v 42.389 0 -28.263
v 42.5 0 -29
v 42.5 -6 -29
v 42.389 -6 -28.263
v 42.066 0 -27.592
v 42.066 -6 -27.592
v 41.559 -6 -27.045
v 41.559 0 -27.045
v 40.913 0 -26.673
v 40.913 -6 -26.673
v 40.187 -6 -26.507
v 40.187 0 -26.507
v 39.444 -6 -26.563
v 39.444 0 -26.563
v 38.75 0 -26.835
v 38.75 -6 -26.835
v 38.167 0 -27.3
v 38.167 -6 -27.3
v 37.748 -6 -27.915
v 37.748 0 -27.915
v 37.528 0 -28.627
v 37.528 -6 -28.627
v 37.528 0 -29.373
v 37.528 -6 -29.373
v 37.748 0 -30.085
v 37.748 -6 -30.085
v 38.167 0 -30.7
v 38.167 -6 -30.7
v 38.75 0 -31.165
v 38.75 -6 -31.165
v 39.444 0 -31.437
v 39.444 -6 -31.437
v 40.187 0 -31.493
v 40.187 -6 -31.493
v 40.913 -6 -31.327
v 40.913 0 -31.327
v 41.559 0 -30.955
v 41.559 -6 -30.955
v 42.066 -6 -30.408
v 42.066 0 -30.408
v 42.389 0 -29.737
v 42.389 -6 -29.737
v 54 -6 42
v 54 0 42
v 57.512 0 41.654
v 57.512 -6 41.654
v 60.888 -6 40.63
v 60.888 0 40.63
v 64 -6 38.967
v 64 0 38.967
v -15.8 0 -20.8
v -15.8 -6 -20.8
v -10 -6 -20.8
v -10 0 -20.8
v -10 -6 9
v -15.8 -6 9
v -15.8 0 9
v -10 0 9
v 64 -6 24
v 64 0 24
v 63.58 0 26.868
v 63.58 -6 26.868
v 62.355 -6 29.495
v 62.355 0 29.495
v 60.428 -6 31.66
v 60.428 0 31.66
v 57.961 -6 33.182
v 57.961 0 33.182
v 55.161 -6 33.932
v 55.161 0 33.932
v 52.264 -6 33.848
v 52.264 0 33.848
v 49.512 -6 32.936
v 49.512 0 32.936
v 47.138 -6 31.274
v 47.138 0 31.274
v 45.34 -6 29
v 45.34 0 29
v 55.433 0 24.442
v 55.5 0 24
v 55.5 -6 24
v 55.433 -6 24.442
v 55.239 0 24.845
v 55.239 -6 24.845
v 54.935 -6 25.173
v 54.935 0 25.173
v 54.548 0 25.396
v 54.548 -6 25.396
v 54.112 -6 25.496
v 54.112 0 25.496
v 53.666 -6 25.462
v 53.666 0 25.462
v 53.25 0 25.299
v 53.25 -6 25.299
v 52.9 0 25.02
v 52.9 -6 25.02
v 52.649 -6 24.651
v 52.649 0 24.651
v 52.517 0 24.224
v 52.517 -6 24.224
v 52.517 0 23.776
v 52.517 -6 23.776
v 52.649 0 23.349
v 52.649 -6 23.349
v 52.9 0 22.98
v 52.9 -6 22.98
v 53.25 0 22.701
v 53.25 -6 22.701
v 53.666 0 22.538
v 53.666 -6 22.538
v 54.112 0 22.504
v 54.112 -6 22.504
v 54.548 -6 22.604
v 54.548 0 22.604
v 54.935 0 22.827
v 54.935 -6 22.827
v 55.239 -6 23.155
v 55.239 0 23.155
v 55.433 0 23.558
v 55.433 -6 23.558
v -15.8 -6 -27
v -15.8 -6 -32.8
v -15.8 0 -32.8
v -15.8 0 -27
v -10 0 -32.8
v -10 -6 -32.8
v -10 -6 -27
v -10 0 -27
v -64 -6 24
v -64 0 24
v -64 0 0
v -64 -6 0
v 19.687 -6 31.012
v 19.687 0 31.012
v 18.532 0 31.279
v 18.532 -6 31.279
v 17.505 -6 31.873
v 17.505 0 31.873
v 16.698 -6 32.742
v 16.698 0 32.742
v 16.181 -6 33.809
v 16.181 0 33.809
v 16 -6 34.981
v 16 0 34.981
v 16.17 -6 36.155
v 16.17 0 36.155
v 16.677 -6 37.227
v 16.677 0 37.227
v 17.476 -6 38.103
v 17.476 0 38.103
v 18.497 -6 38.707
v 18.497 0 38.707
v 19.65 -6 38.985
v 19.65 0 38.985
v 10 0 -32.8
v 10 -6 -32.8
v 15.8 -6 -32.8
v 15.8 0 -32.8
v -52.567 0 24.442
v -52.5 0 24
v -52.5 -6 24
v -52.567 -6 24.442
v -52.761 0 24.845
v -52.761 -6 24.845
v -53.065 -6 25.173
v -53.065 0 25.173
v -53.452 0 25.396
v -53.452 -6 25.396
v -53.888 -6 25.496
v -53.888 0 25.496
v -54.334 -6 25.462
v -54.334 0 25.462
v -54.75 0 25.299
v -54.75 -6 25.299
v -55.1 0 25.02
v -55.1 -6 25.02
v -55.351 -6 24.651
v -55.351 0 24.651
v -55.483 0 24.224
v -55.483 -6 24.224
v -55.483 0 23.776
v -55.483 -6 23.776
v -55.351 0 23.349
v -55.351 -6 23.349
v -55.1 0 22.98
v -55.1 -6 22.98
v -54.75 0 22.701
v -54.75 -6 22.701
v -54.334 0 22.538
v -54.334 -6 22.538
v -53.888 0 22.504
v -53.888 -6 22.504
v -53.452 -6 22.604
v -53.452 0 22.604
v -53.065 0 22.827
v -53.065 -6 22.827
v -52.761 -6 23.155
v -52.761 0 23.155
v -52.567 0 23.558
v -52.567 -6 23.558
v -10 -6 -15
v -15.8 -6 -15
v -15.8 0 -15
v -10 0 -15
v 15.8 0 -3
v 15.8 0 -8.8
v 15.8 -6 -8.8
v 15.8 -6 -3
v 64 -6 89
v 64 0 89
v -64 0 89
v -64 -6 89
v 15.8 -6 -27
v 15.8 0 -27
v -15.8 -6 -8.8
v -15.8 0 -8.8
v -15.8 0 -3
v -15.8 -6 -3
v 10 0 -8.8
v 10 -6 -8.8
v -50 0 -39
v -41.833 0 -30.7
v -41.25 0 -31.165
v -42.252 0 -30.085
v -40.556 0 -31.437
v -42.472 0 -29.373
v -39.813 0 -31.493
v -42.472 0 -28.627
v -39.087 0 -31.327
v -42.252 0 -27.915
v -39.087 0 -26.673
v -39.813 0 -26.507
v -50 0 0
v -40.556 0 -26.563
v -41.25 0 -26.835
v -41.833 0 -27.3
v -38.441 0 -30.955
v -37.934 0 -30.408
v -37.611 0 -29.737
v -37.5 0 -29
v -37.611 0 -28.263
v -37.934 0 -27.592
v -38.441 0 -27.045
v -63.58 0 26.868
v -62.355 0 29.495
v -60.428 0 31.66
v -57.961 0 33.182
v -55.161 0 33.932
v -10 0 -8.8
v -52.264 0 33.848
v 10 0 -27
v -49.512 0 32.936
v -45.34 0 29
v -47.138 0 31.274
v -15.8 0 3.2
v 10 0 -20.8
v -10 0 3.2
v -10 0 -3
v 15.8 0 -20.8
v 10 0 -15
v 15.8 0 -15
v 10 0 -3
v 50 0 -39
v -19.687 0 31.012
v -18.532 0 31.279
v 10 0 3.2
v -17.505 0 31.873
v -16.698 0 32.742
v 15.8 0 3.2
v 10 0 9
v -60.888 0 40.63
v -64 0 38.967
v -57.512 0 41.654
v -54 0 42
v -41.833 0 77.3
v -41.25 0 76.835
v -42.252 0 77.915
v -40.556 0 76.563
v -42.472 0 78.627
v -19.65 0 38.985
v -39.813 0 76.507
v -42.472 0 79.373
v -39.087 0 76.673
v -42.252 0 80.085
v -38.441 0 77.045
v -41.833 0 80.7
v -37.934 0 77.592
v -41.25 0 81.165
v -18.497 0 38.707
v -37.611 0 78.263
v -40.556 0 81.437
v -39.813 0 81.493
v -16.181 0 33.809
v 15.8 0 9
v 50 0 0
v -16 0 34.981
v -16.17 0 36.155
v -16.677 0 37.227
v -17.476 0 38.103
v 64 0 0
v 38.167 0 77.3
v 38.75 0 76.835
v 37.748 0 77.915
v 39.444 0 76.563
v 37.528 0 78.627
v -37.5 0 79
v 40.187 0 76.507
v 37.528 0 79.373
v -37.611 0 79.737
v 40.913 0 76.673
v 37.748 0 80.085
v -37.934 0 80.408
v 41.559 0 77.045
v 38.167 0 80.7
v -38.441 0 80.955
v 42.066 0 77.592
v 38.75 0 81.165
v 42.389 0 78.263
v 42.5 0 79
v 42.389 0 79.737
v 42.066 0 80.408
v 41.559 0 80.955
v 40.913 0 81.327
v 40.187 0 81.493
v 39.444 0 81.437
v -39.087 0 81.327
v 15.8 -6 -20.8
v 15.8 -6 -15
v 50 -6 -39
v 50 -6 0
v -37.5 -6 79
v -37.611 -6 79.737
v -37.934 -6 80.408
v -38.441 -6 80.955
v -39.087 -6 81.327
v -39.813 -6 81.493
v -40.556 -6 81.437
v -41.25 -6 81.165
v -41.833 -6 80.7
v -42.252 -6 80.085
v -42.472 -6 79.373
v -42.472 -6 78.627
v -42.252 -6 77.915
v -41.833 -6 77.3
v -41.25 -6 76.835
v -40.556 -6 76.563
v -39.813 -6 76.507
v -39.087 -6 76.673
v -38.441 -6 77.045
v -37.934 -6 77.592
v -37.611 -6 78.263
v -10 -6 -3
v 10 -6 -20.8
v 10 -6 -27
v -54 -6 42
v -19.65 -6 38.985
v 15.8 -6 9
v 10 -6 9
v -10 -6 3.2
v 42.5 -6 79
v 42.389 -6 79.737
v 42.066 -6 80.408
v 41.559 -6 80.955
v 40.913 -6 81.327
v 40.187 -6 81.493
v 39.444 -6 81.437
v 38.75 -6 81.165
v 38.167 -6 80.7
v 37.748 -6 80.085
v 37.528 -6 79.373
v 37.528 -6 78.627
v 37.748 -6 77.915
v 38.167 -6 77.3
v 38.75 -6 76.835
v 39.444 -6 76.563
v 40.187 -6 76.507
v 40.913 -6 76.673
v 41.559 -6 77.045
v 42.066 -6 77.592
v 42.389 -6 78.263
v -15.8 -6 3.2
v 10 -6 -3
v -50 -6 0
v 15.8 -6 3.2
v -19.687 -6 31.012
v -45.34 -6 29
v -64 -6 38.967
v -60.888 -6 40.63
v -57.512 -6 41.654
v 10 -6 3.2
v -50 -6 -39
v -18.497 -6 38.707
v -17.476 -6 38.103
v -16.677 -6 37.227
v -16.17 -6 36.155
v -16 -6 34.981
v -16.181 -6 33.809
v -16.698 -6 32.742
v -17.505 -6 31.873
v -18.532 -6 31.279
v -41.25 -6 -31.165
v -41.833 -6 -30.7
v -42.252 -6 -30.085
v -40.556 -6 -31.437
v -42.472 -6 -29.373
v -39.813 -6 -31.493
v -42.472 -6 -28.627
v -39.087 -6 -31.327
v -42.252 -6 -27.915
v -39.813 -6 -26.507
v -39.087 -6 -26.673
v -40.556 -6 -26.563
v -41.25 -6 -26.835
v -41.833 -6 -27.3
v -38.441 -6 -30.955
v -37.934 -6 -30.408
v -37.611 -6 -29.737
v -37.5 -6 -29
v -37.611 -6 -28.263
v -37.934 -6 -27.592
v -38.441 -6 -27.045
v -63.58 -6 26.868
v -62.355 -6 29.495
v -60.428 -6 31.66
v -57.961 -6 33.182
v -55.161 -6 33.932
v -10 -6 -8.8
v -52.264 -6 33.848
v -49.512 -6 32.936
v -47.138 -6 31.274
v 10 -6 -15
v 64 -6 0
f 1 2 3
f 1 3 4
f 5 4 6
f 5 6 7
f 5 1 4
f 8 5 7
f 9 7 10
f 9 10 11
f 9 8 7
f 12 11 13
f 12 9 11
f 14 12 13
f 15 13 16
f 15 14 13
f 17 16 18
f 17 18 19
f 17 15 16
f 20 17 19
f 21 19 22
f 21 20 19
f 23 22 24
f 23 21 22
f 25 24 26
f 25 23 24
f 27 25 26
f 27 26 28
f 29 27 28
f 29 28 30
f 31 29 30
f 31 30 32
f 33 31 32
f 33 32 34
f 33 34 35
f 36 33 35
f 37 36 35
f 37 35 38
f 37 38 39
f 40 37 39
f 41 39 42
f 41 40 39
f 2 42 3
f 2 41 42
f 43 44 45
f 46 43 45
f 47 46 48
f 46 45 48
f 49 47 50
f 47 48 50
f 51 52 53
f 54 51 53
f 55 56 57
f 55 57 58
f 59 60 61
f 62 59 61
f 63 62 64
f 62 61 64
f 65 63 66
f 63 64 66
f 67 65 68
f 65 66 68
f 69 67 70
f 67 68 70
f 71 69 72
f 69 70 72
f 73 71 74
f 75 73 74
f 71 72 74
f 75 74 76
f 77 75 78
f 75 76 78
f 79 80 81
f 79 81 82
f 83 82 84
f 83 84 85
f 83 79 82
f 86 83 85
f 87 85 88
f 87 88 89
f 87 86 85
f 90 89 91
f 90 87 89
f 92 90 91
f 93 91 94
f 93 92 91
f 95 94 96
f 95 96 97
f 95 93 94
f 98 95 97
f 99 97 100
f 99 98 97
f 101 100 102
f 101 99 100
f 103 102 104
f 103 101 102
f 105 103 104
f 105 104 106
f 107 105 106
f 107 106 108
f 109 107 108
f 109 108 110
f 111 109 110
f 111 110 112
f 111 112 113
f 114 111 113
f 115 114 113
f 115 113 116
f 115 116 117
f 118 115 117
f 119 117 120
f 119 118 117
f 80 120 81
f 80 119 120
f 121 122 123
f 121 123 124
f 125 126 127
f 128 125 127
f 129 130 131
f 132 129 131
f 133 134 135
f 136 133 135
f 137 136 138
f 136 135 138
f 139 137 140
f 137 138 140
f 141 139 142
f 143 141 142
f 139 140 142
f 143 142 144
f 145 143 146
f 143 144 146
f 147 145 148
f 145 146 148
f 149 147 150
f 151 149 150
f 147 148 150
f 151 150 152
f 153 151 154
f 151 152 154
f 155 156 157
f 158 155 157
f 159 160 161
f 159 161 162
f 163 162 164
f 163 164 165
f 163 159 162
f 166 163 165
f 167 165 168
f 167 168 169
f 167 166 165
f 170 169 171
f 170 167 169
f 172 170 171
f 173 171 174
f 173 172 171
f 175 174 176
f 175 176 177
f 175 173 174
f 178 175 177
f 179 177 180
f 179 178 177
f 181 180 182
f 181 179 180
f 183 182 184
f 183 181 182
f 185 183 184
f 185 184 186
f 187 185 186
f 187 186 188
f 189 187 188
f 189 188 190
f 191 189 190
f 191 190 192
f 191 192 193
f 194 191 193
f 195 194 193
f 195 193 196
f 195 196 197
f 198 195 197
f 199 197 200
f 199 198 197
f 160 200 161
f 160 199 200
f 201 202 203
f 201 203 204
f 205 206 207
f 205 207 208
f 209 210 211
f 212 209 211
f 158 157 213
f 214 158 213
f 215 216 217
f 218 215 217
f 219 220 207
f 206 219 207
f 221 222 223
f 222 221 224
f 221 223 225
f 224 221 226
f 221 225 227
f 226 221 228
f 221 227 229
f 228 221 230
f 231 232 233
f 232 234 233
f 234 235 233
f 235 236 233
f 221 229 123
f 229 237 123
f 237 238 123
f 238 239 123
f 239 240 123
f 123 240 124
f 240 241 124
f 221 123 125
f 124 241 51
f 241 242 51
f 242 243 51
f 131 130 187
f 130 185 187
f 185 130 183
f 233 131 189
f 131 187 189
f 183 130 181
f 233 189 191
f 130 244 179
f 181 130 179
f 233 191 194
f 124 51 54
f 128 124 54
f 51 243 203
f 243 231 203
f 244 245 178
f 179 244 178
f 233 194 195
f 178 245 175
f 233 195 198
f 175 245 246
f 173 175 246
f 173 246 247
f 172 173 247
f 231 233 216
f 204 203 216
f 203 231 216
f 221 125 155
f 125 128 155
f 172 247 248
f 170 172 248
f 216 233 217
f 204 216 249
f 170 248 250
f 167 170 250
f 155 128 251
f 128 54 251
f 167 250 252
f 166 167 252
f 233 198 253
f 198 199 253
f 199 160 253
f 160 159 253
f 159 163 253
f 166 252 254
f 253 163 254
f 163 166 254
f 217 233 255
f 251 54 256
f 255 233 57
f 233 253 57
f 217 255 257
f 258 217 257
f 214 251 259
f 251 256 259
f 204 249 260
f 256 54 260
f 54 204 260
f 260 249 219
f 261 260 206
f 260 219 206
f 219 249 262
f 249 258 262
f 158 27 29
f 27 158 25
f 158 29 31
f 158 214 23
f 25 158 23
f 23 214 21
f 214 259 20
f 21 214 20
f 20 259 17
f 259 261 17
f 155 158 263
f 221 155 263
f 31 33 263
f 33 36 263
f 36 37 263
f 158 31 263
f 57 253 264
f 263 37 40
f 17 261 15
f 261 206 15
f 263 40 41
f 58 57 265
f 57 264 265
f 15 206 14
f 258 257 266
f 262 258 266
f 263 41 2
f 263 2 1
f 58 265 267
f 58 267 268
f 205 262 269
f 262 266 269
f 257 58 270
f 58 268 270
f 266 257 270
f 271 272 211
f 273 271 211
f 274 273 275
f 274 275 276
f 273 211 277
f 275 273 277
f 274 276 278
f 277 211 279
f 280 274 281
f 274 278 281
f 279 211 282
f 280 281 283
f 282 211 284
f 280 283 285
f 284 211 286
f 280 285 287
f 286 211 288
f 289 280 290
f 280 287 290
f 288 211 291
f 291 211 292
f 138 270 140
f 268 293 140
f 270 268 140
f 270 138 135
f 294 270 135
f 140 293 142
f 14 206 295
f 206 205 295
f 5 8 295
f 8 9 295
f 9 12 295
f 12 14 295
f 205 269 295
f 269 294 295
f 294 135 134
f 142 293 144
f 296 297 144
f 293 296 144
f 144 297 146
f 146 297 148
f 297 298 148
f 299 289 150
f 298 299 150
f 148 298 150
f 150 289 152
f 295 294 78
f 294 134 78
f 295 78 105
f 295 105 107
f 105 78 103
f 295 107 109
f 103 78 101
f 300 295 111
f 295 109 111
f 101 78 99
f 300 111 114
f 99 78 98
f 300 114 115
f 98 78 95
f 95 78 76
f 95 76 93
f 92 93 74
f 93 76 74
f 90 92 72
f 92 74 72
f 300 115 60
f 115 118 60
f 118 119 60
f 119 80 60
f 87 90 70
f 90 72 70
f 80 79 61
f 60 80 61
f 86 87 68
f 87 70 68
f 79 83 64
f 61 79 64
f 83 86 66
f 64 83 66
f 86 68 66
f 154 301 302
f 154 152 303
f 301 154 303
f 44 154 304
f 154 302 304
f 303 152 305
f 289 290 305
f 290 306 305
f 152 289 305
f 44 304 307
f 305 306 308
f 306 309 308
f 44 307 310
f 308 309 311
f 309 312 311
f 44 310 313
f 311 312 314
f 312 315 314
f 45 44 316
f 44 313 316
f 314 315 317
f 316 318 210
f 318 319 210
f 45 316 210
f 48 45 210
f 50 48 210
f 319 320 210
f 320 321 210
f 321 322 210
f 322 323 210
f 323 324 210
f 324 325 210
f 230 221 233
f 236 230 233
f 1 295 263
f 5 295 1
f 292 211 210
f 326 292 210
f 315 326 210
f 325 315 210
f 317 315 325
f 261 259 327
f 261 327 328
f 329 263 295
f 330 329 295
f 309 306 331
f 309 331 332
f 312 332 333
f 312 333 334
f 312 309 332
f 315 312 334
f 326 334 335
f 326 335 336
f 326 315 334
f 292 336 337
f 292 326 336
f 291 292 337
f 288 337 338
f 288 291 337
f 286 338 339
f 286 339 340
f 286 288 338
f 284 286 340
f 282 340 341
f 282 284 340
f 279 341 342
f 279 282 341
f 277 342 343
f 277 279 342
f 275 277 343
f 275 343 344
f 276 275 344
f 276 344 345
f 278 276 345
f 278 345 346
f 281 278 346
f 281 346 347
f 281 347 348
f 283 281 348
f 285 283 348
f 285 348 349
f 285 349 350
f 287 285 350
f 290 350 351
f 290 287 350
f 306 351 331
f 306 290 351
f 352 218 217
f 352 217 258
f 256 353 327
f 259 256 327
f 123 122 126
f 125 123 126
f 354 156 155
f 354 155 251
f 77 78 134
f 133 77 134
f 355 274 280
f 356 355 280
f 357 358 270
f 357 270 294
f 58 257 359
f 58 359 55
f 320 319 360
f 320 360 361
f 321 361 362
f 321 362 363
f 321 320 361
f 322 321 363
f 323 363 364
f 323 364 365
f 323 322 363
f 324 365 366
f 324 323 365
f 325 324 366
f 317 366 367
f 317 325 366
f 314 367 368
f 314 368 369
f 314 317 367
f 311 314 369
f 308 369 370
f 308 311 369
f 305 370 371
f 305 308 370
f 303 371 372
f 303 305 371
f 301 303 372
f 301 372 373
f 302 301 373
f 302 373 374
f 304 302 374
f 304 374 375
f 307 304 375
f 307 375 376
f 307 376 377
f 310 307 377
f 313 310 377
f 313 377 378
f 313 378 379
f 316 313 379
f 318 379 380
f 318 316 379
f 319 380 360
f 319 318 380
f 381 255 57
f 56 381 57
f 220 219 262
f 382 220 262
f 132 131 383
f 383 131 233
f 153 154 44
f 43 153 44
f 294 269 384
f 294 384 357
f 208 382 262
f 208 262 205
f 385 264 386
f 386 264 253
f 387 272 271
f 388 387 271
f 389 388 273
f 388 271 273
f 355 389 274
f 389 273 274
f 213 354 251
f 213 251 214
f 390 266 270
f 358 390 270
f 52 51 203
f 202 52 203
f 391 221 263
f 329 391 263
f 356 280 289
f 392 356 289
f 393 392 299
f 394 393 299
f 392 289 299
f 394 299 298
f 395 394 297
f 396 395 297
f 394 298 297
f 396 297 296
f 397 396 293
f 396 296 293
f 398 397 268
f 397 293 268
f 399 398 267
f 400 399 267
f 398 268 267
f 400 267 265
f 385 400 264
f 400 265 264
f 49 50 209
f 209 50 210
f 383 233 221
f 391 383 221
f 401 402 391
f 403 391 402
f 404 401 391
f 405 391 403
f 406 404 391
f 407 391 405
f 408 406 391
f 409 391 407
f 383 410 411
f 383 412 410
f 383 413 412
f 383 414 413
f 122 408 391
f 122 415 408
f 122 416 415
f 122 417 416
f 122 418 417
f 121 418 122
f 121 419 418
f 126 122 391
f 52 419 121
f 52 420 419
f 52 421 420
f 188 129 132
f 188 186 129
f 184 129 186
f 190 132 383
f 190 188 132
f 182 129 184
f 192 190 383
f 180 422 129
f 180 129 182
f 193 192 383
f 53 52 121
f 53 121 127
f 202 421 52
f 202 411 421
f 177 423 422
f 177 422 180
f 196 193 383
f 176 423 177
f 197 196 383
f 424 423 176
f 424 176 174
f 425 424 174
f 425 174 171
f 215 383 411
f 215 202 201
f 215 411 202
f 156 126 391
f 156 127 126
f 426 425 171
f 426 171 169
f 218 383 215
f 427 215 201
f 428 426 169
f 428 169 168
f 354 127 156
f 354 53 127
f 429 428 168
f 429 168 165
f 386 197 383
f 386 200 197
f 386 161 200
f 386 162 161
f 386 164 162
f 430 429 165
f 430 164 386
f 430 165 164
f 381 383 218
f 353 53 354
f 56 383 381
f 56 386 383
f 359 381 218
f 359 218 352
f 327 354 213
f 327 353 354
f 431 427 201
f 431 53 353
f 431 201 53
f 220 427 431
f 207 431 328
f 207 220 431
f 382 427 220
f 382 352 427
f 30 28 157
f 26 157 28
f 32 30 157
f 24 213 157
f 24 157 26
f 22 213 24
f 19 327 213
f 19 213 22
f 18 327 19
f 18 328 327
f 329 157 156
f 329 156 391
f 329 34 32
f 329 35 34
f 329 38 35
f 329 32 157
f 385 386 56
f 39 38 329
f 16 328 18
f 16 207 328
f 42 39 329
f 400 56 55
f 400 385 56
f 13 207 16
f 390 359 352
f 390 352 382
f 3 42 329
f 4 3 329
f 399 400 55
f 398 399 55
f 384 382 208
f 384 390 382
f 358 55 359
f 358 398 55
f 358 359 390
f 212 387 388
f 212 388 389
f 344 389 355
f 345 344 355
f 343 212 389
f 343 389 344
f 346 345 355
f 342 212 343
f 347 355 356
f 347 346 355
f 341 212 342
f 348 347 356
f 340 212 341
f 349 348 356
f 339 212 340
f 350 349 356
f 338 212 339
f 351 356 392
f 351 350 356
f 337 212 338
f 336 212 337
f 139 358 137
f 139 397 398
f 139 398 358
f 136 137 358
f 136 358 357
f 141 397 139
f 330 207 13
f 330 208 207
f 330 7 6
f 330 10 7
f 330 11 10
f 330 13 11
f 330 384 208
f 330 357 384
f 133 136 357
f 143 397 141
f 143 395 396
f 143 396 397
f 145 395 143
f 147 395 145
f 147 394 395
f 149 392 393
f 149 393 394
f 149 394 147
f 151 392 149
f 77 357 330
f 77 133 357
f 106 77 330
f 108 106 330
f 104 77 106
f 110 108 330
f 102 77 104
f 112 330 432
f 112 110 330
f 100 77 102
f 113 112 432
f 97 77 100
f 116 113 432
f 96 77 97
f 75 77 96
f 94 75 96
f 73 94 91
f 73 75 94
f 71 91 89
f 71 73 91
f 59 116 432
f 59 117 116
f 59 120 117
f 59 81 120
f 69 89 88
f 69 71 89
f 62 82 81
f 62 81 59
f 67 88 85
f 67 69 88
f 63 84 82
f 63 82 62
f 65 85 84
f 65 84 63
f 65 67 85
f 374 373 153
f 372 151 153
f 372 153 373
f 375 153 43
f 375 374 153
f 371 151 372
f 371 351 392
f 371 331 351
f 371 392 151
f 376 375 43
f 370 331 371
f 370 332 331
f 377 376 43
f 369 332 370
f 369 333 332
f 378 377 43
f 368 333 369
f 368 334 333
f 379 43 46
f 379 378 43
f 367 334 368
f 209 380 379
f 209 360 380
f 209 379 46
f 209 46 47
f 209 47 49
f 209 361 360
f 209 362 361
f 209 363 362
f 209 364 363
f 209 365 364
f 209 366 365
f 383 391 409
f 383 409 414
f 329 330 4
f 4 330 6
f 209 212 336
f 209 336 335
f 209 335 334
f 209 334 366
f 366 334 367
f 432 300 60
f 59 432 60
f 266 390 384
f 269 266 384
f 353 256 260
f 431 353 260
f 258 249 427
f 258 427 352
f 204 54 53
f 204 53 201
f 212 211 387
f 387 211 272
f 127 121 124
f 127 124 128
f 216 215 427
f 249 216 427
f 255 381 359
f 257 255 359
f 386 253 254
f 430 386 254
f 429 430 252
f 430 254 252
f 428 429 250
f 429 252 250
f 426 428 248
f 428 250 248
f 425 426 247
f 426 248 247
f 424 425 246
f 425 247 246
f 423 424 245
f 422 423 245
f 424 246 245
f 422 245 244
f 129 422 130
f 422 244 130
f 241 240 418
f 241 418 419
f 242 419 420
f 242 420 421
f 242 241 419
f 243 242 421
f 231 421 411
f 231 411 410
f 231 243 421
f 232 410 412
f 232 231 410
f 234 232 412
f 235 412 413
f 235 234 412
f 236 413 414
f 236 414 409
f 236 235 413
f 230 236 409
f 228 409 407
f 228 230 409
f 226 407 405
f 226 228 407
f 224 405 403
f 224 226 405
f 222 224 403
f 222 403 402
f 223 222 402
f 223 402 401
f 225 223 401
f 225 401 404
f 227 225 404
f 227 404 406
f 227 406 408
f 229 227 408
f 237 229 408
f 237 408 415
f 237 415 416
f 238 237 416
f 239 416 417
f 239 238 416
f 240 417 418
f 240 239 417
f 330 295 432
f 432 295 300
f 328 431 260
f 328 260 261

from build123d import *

# Parameters (mm, degrees)
F0_R     = 2.5
F0_W     = 5.8
F0_H     = 5.8
F0_R_2   = 1.5
F1_DEPTH = 6


with BuildPart() as f1:
    # F0 (on Front) → F1 (new body)
    with BuildSketch(Plane.XZ):
        with BuildLine():
            Line((-50, 0), (-50, -39))
            Line((-50, -39), (50, -39))
            Line((50, -39), (50, 0))
            Line((50, 0), (64, 0))
            Line((64, 0), (64, 24))
            ThreePointArc((64, 24), (56.58819, 33.659258), (45.339746, 29))
            Line((45.339746, 29), (19.687191, 31.01225))
            ThreePointArc((19.687191, 31.01225), (16.000043, 34.981448), (19.650214, 38.984677))
            Line((19.650214, 38.984677), (54, 42))
            ThreePointArc((54, 42), (59.224972, 41.224972), (64, 38.96663))
            Line((64, 38.96663), (64, 89))
            Line((64, 89), (-64, 89))
            Line((-64, 89), (-64, 38.96663))
            ThreePointArc((-64, 38.96663), (-59.224972, 41.224972), (-54, 42))
            Line((-54, 42), (-19.650214, 38.984677))
            ThreePointArc((-19.650214, 38.984677), (-16.000043, 34.981448), (-19.687191, 31.01225))
            Line((-19.687191, 31.01225), (-45.339746, 29))
            ThreePointArc((-45.339746, 29), (-56.58819, 33.659258), (-64, 24))
            Line((-64, 24), (-64, 0))
            Line((-64, 0), (-50, 0))
        make_face()
        with Locations((-40, -29)):
            Circle(F0_R, mode=Mode.SUBTRACT)
        with Locations((-12.9, -29.9)):
            Rectangle(F0_W, F0_H, mode=Mode.SUBTRACT)
        with Locations((-12.9, -17.9)):
            Rectangle(F0_W, F0_H, mode=Mode.SUBTRACT)
        with Locations((-54, 24)):
            Circle(F0_R_2, mode=Mode.SUBTRACT)
        with Locations((-12.9, -5.9)):
            Rectangle(F0_W, F0_H, mode=Mode.SUBTRACT)
        with Locations((-12.9, 6.1)):
            Rectangle(F0_W, F0_H, mode=Mode.SUBTRACT)
        with Locations((12.9, -29.9)):
            Rectangle(F0_W, F0_H, mode=Mode.SUBTRACT)
        with Locations((12.9, -17.9)):
            Rectangle(F0_W, F0_H, mode=Mode.SUBTRACT)
        with Locations((40, -29)):
            Circle(F0_R, mode=Mode.SUBTRACT)
        with Locations((12.9, -5.9)):
            Rectangle(F0_W, F0_H, mode=Mode.SUBTRACT)
        with Locations((12.9, 6.1)):
            Rectangle(F0_W, F0_H, mode=Mode.SUBTRACT)
        with Locations((54, 24)):
            Circle(F0_R_2, mode=Mode.SUBTRACT)
        with Locations((-40, 79)):
            Circle(F0_R, mode=Mode.SUBTRACT)
        with Locations((40, 79)):
            Circle(F0_R, mode=Mode.SUBTRACT)
    extrude(amount=F1_DEPTH)


solid = f1.part
